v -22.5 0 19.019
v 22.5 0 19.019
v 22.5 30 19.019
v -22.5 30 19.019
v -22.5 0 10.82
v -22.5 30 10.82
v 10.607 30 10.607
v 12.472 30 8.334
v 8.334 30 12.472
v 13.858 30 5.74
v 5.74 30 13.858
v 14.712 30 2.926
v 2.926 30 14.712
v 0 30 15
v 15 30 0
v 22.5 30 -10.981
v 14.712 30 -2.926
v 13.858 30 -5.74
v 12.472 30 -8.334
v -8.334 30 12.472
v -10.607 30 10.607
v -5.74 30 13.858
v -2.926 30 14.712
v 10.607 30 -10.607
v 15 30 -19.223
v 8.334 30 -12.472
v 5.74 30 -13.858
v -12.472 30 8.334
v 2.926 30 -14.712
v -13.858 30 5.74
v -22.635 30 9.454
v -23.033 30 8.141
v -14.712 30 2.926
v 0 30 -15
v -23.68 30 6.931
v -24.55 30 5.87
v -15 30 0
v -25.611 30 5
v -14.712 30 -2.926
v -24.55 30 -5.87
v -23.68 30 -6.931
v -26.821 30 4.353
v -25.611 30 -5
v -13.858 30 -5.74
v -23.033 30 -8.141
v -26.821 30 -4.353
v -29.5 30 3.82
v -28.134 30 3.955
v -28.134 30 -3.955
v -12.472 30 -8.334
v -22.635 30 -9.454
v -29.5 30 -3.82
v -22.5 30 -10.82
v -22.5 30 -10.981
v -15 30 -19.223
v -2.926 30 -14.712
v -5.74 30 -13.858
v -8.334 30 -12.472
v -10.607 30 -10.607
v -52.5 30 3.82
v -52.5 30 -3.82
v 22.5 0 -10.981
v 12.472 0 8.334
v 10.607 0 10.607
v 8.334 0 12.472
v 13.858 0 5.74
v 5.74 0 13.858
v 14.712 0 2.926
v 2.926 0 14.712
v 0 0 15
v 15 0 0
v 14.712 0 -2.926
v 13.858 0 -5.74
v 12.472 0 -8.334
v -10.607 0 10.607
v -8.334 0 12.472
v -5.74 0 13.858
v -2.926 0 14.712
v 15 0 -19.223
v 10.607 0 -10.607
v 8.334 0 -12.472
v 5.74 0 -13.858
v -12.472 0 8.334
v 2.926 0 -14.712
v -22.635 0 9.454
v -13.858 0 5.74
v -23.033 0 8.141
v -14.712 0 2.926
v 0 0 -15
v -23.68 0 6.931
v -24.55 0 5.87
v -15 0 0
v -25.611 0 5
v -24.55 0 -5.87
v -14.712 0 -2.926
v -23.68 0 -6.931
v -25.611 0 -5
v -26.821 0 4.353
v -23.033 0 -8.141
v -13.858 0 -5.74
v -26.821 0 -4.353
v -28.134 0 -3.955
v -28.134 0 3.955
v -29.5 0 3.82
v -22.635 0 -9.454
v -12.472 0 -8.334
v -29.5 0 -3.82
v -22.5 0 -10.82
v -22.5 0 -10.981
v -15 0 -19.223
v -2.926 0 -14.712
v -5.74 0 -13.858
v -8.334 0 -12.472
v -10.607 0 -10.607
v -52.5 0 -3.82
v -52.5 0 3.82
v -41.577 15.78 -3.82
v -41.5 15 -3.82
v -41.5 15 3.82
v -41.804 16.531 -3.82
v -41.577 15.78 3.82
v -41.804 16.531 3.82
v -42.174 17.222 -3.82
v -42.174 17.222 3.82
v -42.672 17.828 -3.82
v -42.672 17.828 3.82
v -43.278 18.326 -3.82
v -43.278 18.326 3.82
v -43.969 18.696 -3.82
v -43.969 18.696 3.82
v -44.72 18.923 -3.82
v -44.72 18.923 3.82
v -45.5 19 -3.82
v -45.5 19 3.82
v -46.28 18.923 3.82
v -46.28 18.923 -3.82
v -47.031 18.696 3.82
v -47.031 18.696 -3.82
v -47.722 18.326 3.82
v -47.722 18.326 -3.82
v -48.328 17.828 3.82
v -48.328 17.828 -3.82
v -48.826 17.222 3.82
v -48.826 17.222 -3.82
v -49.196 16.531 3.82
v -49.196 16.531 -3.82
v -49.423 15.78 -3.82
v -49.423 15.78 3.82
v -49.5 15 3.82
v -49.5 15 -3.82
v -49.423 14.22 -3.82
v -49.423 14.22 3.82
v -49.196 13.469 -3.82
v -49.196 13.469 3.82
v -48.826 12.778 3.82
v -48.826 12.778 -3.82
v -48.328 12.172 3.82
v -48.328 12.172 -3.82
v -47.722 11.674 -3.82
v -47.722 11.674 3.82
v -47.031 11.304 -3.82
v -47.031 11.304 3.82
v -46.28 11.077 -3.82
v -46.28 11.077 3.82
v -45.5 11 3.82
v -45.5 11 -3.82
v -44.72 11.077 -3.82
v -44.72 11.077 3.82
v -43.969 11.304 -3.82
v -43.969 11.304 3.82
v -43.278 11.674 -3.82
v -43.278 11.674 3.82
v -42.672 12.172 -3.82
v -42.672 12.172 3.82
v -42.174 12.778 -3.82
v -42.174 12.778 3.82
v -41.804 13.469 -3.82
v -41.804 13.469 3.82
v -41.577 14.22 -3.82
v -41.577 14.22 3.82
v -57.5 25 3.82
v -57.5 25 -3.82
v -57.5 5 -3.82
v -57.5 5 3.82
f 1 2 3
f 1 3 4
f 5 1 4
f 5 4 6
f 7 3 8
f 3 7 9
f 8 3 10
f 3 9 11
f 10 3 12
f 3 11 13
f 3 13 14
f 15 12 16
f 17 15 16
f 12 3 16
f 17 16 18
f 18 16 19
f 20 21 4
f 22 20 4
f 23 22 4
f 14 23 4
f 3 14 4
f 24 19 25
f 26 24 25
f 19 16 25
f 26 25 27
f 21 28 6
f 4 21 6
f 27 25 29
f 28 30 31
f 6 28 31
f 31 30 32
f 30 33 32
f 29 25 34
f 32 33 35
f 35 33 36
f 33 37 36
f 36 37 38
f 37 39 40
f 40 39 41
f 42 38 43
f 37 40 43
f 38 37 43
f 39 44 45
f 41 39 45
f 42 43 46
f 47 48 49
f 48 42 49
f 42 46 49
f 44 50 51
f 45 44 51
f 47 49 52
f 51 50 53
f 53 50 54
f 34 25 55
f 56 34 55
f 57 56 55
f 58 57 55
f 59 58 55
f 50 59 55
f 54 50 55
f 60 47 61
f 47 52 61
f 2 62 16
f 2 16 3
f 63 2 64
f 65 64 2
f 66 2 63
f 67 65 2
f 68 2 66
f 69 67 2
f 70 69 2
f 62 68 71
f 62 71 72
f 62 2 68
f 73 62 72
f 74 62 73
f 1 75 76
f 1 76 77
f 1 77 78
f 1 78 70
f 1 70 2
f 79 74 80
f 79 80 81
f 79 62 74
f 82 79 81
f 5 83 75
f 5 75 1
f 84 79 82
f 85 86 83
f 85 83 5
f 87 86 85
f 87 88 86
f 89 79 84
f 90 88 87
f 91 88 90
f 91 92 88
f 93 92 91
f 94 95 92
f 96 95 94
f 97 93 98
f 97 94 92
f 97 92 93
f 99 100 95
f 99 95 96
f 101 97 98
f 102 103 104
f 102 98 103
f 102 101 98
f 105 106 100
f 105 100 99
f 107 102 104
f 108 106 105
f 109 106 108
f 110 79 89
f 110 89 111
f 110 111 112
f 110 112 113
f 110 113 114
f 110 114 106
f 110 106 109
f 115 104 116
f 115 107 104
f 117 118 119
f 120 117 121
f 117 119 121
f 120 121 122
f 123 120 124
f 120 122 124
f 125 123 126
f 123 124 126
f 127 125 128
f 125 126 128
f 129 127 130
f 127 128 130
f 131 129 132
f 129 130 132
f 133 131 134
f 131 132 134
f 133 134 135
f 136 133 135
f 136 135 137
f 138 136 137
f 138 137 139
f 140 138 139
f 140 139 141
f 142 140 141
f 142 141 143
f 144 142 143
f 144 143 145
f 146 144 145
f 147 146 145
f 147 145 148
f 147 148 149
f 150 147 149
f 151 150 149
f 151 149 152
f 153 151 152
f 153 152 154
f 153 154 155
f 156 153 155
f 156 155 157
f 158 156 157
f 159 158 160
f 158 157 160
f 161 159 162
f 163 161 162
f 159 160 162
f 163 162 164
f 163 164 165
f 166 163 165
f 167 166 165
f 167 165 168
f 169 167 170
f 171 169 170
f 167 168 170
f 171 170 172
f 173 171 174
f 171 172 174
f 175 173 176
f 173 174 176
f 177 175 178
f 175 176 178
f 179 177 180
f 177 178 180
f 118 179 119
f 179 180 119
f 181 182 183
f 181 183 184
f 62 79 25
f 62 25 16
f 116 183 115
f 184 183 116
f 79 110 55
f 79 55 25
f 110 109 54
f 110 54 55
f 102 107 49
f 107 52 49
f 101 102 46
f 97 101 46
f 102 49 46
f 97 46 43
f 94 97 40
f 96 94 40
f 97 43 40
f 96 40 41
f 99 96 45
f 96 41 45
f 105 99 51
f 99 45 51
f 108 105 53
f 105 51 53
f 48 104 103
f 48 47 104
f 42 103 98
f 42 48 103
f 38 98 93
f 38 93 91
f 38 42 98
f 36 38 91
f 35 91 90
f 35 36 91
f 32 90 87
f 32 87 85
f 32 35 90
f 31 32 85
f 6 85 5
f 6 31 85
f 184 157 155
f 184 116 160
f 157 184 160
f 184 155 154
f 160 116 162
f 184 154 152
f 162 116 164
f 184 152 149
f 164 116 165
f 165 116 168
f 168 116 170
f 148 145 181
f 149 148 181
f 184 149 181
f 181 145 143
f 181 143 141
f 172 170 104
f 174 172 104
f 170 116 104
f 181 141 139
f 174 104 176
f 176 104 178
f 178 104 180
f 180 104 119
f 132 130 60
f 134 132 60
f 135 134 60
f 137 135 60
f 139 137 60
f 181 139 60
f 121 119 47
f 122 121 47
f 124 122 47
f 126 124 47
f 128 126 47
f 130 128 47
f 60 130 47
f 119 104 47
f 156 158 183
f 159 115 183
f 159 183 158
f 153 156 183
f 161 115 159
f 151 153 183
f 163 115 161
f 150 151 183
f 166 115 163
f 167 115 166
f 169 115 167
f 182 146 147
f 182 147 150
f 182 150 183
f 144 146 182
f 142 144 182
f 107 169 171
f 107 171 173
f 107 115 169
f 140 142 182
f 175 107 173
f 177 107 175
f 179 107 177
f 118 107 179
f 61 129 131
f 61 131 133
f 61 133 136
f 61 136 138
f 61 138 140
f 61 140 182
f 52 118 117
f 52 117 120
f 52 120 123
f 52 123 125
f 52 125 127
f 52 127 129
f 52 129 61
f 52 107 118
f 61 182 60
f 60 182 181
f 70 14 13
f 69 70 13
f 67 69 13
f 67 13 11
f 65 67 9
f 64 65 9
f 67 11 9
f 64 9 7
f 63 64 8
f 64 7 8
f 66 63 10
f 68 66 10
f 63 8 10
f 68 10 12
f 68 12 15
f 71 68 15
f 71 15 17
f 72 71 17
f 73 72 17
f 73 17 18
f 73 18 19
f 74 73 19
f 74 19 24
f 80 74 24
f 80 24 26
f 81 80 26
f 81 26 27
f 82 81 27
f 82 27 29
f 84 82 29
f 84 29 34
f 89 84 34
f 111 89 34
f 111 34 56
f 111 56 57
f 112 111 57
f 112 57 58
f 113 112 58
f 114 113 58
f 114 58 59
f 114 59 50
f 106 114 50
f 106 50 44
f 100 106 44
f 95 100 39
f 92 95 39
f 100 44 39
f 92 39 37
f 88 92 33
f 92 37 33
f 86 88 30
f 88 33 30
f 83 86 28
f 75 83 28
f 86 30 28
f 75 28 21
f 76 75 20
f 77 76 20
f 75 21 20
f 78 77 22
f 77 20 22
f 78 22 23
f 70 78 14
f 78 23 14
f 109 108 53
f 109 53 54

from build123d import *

# Parameters (mm, degrees)
EXTRUDE_1_DEPTH     = 30
SKETCH_2_R          = 15
CUT_EXTRUDE_2_DEPTH = 43.140141425
SKETCH_3_W          = 7.64
SKETCH_3_H          = 30
EXTRUDE_3_DEPTH     = 35
CHAMFER_1_SIZE      = 5
SKETCH_5_R          = 4
CUT_EXTRUDE_4_DEPTH = 69.827691917
FILLET_2_R          = 7
FILLET_3_R          = 7


with BuildPart() as part:
    # Эскиз1 → Вытянуть1 (new body)
    with BuildSketch(Plane(origin=(0, 0, 0), x_dir=(1, 0, 0), z_dir=(0, 1, 0))):
        Polygon((22.5, -19.019063342), (-22.5, -19.019063342), (-22.5, 10.980936658), (-15, 19.22346273), (15, 19.22346273), (22.5, 10.980936658), align=None)
    extrude(amount=EXTRUDE_1_DEPTH)

    # Эскиз2 → Вытянуть2 (cut, through all)
    with BuildSketch(Plane(origin=(0, 30, 0), x_dir=(1, 0, 0), z_dir=(0, 1, 0))):
        with Locations(Location((0, 0, 0), (0, 0, 270))):
            Circle(SKETCH_2_R)
    extrude(amount=-CUT_EXTRUDE_2_DEPTH, mode=Mode.SUBTRACT)

    # Эскиз3 → Вытянуть3 (add)
    with BuildSketch(Plane.ZY.offset(22.5)):
        with Locations((0, 15)):
            Rectangle(SKETCH_3_W, SKETCH_3_H)
    extrude(amount=EXTRUDE_3_DEPTH)

    # Фаска1
    chamfer_1_edges = [part.edges().sort_by_distance(p)[0] for p in [
        (-57.5, 0, 0),
        (-57.5, 30, 0),
    ]]
    chamfer(chamfer_1_edges, length=CHAMFER_1_SIZE)

    # Эскиз5 → Вытянуть4 (cut, through all)
    with BuildSketch(Plane.XY.offset(3.82)):
        with Locations((-45.5, 15)):
            Circle(SKETCH_5_R)
    extrude(amount=-CUT_EXTRUDE_4_DEPTH, mode=Mode.SUBTRACT)

    # Скругление2
    fillet_2_edges = [part.edges().sort_by_distance(p)[0] for p in [
        (-22.5, 15, -3.82),
    ]]
    fillet(fillet_2_edges, radius=FILLET_2_R)

    # Скругление3
    fillet_3_edges = [part.edges().sort_by_distance(p)[0] for p in [
        (-22.5, 15, 3.82),
    ]]
    fillet(fillet_3_edges, radius=FILLET_3_R)


solid = part.part
